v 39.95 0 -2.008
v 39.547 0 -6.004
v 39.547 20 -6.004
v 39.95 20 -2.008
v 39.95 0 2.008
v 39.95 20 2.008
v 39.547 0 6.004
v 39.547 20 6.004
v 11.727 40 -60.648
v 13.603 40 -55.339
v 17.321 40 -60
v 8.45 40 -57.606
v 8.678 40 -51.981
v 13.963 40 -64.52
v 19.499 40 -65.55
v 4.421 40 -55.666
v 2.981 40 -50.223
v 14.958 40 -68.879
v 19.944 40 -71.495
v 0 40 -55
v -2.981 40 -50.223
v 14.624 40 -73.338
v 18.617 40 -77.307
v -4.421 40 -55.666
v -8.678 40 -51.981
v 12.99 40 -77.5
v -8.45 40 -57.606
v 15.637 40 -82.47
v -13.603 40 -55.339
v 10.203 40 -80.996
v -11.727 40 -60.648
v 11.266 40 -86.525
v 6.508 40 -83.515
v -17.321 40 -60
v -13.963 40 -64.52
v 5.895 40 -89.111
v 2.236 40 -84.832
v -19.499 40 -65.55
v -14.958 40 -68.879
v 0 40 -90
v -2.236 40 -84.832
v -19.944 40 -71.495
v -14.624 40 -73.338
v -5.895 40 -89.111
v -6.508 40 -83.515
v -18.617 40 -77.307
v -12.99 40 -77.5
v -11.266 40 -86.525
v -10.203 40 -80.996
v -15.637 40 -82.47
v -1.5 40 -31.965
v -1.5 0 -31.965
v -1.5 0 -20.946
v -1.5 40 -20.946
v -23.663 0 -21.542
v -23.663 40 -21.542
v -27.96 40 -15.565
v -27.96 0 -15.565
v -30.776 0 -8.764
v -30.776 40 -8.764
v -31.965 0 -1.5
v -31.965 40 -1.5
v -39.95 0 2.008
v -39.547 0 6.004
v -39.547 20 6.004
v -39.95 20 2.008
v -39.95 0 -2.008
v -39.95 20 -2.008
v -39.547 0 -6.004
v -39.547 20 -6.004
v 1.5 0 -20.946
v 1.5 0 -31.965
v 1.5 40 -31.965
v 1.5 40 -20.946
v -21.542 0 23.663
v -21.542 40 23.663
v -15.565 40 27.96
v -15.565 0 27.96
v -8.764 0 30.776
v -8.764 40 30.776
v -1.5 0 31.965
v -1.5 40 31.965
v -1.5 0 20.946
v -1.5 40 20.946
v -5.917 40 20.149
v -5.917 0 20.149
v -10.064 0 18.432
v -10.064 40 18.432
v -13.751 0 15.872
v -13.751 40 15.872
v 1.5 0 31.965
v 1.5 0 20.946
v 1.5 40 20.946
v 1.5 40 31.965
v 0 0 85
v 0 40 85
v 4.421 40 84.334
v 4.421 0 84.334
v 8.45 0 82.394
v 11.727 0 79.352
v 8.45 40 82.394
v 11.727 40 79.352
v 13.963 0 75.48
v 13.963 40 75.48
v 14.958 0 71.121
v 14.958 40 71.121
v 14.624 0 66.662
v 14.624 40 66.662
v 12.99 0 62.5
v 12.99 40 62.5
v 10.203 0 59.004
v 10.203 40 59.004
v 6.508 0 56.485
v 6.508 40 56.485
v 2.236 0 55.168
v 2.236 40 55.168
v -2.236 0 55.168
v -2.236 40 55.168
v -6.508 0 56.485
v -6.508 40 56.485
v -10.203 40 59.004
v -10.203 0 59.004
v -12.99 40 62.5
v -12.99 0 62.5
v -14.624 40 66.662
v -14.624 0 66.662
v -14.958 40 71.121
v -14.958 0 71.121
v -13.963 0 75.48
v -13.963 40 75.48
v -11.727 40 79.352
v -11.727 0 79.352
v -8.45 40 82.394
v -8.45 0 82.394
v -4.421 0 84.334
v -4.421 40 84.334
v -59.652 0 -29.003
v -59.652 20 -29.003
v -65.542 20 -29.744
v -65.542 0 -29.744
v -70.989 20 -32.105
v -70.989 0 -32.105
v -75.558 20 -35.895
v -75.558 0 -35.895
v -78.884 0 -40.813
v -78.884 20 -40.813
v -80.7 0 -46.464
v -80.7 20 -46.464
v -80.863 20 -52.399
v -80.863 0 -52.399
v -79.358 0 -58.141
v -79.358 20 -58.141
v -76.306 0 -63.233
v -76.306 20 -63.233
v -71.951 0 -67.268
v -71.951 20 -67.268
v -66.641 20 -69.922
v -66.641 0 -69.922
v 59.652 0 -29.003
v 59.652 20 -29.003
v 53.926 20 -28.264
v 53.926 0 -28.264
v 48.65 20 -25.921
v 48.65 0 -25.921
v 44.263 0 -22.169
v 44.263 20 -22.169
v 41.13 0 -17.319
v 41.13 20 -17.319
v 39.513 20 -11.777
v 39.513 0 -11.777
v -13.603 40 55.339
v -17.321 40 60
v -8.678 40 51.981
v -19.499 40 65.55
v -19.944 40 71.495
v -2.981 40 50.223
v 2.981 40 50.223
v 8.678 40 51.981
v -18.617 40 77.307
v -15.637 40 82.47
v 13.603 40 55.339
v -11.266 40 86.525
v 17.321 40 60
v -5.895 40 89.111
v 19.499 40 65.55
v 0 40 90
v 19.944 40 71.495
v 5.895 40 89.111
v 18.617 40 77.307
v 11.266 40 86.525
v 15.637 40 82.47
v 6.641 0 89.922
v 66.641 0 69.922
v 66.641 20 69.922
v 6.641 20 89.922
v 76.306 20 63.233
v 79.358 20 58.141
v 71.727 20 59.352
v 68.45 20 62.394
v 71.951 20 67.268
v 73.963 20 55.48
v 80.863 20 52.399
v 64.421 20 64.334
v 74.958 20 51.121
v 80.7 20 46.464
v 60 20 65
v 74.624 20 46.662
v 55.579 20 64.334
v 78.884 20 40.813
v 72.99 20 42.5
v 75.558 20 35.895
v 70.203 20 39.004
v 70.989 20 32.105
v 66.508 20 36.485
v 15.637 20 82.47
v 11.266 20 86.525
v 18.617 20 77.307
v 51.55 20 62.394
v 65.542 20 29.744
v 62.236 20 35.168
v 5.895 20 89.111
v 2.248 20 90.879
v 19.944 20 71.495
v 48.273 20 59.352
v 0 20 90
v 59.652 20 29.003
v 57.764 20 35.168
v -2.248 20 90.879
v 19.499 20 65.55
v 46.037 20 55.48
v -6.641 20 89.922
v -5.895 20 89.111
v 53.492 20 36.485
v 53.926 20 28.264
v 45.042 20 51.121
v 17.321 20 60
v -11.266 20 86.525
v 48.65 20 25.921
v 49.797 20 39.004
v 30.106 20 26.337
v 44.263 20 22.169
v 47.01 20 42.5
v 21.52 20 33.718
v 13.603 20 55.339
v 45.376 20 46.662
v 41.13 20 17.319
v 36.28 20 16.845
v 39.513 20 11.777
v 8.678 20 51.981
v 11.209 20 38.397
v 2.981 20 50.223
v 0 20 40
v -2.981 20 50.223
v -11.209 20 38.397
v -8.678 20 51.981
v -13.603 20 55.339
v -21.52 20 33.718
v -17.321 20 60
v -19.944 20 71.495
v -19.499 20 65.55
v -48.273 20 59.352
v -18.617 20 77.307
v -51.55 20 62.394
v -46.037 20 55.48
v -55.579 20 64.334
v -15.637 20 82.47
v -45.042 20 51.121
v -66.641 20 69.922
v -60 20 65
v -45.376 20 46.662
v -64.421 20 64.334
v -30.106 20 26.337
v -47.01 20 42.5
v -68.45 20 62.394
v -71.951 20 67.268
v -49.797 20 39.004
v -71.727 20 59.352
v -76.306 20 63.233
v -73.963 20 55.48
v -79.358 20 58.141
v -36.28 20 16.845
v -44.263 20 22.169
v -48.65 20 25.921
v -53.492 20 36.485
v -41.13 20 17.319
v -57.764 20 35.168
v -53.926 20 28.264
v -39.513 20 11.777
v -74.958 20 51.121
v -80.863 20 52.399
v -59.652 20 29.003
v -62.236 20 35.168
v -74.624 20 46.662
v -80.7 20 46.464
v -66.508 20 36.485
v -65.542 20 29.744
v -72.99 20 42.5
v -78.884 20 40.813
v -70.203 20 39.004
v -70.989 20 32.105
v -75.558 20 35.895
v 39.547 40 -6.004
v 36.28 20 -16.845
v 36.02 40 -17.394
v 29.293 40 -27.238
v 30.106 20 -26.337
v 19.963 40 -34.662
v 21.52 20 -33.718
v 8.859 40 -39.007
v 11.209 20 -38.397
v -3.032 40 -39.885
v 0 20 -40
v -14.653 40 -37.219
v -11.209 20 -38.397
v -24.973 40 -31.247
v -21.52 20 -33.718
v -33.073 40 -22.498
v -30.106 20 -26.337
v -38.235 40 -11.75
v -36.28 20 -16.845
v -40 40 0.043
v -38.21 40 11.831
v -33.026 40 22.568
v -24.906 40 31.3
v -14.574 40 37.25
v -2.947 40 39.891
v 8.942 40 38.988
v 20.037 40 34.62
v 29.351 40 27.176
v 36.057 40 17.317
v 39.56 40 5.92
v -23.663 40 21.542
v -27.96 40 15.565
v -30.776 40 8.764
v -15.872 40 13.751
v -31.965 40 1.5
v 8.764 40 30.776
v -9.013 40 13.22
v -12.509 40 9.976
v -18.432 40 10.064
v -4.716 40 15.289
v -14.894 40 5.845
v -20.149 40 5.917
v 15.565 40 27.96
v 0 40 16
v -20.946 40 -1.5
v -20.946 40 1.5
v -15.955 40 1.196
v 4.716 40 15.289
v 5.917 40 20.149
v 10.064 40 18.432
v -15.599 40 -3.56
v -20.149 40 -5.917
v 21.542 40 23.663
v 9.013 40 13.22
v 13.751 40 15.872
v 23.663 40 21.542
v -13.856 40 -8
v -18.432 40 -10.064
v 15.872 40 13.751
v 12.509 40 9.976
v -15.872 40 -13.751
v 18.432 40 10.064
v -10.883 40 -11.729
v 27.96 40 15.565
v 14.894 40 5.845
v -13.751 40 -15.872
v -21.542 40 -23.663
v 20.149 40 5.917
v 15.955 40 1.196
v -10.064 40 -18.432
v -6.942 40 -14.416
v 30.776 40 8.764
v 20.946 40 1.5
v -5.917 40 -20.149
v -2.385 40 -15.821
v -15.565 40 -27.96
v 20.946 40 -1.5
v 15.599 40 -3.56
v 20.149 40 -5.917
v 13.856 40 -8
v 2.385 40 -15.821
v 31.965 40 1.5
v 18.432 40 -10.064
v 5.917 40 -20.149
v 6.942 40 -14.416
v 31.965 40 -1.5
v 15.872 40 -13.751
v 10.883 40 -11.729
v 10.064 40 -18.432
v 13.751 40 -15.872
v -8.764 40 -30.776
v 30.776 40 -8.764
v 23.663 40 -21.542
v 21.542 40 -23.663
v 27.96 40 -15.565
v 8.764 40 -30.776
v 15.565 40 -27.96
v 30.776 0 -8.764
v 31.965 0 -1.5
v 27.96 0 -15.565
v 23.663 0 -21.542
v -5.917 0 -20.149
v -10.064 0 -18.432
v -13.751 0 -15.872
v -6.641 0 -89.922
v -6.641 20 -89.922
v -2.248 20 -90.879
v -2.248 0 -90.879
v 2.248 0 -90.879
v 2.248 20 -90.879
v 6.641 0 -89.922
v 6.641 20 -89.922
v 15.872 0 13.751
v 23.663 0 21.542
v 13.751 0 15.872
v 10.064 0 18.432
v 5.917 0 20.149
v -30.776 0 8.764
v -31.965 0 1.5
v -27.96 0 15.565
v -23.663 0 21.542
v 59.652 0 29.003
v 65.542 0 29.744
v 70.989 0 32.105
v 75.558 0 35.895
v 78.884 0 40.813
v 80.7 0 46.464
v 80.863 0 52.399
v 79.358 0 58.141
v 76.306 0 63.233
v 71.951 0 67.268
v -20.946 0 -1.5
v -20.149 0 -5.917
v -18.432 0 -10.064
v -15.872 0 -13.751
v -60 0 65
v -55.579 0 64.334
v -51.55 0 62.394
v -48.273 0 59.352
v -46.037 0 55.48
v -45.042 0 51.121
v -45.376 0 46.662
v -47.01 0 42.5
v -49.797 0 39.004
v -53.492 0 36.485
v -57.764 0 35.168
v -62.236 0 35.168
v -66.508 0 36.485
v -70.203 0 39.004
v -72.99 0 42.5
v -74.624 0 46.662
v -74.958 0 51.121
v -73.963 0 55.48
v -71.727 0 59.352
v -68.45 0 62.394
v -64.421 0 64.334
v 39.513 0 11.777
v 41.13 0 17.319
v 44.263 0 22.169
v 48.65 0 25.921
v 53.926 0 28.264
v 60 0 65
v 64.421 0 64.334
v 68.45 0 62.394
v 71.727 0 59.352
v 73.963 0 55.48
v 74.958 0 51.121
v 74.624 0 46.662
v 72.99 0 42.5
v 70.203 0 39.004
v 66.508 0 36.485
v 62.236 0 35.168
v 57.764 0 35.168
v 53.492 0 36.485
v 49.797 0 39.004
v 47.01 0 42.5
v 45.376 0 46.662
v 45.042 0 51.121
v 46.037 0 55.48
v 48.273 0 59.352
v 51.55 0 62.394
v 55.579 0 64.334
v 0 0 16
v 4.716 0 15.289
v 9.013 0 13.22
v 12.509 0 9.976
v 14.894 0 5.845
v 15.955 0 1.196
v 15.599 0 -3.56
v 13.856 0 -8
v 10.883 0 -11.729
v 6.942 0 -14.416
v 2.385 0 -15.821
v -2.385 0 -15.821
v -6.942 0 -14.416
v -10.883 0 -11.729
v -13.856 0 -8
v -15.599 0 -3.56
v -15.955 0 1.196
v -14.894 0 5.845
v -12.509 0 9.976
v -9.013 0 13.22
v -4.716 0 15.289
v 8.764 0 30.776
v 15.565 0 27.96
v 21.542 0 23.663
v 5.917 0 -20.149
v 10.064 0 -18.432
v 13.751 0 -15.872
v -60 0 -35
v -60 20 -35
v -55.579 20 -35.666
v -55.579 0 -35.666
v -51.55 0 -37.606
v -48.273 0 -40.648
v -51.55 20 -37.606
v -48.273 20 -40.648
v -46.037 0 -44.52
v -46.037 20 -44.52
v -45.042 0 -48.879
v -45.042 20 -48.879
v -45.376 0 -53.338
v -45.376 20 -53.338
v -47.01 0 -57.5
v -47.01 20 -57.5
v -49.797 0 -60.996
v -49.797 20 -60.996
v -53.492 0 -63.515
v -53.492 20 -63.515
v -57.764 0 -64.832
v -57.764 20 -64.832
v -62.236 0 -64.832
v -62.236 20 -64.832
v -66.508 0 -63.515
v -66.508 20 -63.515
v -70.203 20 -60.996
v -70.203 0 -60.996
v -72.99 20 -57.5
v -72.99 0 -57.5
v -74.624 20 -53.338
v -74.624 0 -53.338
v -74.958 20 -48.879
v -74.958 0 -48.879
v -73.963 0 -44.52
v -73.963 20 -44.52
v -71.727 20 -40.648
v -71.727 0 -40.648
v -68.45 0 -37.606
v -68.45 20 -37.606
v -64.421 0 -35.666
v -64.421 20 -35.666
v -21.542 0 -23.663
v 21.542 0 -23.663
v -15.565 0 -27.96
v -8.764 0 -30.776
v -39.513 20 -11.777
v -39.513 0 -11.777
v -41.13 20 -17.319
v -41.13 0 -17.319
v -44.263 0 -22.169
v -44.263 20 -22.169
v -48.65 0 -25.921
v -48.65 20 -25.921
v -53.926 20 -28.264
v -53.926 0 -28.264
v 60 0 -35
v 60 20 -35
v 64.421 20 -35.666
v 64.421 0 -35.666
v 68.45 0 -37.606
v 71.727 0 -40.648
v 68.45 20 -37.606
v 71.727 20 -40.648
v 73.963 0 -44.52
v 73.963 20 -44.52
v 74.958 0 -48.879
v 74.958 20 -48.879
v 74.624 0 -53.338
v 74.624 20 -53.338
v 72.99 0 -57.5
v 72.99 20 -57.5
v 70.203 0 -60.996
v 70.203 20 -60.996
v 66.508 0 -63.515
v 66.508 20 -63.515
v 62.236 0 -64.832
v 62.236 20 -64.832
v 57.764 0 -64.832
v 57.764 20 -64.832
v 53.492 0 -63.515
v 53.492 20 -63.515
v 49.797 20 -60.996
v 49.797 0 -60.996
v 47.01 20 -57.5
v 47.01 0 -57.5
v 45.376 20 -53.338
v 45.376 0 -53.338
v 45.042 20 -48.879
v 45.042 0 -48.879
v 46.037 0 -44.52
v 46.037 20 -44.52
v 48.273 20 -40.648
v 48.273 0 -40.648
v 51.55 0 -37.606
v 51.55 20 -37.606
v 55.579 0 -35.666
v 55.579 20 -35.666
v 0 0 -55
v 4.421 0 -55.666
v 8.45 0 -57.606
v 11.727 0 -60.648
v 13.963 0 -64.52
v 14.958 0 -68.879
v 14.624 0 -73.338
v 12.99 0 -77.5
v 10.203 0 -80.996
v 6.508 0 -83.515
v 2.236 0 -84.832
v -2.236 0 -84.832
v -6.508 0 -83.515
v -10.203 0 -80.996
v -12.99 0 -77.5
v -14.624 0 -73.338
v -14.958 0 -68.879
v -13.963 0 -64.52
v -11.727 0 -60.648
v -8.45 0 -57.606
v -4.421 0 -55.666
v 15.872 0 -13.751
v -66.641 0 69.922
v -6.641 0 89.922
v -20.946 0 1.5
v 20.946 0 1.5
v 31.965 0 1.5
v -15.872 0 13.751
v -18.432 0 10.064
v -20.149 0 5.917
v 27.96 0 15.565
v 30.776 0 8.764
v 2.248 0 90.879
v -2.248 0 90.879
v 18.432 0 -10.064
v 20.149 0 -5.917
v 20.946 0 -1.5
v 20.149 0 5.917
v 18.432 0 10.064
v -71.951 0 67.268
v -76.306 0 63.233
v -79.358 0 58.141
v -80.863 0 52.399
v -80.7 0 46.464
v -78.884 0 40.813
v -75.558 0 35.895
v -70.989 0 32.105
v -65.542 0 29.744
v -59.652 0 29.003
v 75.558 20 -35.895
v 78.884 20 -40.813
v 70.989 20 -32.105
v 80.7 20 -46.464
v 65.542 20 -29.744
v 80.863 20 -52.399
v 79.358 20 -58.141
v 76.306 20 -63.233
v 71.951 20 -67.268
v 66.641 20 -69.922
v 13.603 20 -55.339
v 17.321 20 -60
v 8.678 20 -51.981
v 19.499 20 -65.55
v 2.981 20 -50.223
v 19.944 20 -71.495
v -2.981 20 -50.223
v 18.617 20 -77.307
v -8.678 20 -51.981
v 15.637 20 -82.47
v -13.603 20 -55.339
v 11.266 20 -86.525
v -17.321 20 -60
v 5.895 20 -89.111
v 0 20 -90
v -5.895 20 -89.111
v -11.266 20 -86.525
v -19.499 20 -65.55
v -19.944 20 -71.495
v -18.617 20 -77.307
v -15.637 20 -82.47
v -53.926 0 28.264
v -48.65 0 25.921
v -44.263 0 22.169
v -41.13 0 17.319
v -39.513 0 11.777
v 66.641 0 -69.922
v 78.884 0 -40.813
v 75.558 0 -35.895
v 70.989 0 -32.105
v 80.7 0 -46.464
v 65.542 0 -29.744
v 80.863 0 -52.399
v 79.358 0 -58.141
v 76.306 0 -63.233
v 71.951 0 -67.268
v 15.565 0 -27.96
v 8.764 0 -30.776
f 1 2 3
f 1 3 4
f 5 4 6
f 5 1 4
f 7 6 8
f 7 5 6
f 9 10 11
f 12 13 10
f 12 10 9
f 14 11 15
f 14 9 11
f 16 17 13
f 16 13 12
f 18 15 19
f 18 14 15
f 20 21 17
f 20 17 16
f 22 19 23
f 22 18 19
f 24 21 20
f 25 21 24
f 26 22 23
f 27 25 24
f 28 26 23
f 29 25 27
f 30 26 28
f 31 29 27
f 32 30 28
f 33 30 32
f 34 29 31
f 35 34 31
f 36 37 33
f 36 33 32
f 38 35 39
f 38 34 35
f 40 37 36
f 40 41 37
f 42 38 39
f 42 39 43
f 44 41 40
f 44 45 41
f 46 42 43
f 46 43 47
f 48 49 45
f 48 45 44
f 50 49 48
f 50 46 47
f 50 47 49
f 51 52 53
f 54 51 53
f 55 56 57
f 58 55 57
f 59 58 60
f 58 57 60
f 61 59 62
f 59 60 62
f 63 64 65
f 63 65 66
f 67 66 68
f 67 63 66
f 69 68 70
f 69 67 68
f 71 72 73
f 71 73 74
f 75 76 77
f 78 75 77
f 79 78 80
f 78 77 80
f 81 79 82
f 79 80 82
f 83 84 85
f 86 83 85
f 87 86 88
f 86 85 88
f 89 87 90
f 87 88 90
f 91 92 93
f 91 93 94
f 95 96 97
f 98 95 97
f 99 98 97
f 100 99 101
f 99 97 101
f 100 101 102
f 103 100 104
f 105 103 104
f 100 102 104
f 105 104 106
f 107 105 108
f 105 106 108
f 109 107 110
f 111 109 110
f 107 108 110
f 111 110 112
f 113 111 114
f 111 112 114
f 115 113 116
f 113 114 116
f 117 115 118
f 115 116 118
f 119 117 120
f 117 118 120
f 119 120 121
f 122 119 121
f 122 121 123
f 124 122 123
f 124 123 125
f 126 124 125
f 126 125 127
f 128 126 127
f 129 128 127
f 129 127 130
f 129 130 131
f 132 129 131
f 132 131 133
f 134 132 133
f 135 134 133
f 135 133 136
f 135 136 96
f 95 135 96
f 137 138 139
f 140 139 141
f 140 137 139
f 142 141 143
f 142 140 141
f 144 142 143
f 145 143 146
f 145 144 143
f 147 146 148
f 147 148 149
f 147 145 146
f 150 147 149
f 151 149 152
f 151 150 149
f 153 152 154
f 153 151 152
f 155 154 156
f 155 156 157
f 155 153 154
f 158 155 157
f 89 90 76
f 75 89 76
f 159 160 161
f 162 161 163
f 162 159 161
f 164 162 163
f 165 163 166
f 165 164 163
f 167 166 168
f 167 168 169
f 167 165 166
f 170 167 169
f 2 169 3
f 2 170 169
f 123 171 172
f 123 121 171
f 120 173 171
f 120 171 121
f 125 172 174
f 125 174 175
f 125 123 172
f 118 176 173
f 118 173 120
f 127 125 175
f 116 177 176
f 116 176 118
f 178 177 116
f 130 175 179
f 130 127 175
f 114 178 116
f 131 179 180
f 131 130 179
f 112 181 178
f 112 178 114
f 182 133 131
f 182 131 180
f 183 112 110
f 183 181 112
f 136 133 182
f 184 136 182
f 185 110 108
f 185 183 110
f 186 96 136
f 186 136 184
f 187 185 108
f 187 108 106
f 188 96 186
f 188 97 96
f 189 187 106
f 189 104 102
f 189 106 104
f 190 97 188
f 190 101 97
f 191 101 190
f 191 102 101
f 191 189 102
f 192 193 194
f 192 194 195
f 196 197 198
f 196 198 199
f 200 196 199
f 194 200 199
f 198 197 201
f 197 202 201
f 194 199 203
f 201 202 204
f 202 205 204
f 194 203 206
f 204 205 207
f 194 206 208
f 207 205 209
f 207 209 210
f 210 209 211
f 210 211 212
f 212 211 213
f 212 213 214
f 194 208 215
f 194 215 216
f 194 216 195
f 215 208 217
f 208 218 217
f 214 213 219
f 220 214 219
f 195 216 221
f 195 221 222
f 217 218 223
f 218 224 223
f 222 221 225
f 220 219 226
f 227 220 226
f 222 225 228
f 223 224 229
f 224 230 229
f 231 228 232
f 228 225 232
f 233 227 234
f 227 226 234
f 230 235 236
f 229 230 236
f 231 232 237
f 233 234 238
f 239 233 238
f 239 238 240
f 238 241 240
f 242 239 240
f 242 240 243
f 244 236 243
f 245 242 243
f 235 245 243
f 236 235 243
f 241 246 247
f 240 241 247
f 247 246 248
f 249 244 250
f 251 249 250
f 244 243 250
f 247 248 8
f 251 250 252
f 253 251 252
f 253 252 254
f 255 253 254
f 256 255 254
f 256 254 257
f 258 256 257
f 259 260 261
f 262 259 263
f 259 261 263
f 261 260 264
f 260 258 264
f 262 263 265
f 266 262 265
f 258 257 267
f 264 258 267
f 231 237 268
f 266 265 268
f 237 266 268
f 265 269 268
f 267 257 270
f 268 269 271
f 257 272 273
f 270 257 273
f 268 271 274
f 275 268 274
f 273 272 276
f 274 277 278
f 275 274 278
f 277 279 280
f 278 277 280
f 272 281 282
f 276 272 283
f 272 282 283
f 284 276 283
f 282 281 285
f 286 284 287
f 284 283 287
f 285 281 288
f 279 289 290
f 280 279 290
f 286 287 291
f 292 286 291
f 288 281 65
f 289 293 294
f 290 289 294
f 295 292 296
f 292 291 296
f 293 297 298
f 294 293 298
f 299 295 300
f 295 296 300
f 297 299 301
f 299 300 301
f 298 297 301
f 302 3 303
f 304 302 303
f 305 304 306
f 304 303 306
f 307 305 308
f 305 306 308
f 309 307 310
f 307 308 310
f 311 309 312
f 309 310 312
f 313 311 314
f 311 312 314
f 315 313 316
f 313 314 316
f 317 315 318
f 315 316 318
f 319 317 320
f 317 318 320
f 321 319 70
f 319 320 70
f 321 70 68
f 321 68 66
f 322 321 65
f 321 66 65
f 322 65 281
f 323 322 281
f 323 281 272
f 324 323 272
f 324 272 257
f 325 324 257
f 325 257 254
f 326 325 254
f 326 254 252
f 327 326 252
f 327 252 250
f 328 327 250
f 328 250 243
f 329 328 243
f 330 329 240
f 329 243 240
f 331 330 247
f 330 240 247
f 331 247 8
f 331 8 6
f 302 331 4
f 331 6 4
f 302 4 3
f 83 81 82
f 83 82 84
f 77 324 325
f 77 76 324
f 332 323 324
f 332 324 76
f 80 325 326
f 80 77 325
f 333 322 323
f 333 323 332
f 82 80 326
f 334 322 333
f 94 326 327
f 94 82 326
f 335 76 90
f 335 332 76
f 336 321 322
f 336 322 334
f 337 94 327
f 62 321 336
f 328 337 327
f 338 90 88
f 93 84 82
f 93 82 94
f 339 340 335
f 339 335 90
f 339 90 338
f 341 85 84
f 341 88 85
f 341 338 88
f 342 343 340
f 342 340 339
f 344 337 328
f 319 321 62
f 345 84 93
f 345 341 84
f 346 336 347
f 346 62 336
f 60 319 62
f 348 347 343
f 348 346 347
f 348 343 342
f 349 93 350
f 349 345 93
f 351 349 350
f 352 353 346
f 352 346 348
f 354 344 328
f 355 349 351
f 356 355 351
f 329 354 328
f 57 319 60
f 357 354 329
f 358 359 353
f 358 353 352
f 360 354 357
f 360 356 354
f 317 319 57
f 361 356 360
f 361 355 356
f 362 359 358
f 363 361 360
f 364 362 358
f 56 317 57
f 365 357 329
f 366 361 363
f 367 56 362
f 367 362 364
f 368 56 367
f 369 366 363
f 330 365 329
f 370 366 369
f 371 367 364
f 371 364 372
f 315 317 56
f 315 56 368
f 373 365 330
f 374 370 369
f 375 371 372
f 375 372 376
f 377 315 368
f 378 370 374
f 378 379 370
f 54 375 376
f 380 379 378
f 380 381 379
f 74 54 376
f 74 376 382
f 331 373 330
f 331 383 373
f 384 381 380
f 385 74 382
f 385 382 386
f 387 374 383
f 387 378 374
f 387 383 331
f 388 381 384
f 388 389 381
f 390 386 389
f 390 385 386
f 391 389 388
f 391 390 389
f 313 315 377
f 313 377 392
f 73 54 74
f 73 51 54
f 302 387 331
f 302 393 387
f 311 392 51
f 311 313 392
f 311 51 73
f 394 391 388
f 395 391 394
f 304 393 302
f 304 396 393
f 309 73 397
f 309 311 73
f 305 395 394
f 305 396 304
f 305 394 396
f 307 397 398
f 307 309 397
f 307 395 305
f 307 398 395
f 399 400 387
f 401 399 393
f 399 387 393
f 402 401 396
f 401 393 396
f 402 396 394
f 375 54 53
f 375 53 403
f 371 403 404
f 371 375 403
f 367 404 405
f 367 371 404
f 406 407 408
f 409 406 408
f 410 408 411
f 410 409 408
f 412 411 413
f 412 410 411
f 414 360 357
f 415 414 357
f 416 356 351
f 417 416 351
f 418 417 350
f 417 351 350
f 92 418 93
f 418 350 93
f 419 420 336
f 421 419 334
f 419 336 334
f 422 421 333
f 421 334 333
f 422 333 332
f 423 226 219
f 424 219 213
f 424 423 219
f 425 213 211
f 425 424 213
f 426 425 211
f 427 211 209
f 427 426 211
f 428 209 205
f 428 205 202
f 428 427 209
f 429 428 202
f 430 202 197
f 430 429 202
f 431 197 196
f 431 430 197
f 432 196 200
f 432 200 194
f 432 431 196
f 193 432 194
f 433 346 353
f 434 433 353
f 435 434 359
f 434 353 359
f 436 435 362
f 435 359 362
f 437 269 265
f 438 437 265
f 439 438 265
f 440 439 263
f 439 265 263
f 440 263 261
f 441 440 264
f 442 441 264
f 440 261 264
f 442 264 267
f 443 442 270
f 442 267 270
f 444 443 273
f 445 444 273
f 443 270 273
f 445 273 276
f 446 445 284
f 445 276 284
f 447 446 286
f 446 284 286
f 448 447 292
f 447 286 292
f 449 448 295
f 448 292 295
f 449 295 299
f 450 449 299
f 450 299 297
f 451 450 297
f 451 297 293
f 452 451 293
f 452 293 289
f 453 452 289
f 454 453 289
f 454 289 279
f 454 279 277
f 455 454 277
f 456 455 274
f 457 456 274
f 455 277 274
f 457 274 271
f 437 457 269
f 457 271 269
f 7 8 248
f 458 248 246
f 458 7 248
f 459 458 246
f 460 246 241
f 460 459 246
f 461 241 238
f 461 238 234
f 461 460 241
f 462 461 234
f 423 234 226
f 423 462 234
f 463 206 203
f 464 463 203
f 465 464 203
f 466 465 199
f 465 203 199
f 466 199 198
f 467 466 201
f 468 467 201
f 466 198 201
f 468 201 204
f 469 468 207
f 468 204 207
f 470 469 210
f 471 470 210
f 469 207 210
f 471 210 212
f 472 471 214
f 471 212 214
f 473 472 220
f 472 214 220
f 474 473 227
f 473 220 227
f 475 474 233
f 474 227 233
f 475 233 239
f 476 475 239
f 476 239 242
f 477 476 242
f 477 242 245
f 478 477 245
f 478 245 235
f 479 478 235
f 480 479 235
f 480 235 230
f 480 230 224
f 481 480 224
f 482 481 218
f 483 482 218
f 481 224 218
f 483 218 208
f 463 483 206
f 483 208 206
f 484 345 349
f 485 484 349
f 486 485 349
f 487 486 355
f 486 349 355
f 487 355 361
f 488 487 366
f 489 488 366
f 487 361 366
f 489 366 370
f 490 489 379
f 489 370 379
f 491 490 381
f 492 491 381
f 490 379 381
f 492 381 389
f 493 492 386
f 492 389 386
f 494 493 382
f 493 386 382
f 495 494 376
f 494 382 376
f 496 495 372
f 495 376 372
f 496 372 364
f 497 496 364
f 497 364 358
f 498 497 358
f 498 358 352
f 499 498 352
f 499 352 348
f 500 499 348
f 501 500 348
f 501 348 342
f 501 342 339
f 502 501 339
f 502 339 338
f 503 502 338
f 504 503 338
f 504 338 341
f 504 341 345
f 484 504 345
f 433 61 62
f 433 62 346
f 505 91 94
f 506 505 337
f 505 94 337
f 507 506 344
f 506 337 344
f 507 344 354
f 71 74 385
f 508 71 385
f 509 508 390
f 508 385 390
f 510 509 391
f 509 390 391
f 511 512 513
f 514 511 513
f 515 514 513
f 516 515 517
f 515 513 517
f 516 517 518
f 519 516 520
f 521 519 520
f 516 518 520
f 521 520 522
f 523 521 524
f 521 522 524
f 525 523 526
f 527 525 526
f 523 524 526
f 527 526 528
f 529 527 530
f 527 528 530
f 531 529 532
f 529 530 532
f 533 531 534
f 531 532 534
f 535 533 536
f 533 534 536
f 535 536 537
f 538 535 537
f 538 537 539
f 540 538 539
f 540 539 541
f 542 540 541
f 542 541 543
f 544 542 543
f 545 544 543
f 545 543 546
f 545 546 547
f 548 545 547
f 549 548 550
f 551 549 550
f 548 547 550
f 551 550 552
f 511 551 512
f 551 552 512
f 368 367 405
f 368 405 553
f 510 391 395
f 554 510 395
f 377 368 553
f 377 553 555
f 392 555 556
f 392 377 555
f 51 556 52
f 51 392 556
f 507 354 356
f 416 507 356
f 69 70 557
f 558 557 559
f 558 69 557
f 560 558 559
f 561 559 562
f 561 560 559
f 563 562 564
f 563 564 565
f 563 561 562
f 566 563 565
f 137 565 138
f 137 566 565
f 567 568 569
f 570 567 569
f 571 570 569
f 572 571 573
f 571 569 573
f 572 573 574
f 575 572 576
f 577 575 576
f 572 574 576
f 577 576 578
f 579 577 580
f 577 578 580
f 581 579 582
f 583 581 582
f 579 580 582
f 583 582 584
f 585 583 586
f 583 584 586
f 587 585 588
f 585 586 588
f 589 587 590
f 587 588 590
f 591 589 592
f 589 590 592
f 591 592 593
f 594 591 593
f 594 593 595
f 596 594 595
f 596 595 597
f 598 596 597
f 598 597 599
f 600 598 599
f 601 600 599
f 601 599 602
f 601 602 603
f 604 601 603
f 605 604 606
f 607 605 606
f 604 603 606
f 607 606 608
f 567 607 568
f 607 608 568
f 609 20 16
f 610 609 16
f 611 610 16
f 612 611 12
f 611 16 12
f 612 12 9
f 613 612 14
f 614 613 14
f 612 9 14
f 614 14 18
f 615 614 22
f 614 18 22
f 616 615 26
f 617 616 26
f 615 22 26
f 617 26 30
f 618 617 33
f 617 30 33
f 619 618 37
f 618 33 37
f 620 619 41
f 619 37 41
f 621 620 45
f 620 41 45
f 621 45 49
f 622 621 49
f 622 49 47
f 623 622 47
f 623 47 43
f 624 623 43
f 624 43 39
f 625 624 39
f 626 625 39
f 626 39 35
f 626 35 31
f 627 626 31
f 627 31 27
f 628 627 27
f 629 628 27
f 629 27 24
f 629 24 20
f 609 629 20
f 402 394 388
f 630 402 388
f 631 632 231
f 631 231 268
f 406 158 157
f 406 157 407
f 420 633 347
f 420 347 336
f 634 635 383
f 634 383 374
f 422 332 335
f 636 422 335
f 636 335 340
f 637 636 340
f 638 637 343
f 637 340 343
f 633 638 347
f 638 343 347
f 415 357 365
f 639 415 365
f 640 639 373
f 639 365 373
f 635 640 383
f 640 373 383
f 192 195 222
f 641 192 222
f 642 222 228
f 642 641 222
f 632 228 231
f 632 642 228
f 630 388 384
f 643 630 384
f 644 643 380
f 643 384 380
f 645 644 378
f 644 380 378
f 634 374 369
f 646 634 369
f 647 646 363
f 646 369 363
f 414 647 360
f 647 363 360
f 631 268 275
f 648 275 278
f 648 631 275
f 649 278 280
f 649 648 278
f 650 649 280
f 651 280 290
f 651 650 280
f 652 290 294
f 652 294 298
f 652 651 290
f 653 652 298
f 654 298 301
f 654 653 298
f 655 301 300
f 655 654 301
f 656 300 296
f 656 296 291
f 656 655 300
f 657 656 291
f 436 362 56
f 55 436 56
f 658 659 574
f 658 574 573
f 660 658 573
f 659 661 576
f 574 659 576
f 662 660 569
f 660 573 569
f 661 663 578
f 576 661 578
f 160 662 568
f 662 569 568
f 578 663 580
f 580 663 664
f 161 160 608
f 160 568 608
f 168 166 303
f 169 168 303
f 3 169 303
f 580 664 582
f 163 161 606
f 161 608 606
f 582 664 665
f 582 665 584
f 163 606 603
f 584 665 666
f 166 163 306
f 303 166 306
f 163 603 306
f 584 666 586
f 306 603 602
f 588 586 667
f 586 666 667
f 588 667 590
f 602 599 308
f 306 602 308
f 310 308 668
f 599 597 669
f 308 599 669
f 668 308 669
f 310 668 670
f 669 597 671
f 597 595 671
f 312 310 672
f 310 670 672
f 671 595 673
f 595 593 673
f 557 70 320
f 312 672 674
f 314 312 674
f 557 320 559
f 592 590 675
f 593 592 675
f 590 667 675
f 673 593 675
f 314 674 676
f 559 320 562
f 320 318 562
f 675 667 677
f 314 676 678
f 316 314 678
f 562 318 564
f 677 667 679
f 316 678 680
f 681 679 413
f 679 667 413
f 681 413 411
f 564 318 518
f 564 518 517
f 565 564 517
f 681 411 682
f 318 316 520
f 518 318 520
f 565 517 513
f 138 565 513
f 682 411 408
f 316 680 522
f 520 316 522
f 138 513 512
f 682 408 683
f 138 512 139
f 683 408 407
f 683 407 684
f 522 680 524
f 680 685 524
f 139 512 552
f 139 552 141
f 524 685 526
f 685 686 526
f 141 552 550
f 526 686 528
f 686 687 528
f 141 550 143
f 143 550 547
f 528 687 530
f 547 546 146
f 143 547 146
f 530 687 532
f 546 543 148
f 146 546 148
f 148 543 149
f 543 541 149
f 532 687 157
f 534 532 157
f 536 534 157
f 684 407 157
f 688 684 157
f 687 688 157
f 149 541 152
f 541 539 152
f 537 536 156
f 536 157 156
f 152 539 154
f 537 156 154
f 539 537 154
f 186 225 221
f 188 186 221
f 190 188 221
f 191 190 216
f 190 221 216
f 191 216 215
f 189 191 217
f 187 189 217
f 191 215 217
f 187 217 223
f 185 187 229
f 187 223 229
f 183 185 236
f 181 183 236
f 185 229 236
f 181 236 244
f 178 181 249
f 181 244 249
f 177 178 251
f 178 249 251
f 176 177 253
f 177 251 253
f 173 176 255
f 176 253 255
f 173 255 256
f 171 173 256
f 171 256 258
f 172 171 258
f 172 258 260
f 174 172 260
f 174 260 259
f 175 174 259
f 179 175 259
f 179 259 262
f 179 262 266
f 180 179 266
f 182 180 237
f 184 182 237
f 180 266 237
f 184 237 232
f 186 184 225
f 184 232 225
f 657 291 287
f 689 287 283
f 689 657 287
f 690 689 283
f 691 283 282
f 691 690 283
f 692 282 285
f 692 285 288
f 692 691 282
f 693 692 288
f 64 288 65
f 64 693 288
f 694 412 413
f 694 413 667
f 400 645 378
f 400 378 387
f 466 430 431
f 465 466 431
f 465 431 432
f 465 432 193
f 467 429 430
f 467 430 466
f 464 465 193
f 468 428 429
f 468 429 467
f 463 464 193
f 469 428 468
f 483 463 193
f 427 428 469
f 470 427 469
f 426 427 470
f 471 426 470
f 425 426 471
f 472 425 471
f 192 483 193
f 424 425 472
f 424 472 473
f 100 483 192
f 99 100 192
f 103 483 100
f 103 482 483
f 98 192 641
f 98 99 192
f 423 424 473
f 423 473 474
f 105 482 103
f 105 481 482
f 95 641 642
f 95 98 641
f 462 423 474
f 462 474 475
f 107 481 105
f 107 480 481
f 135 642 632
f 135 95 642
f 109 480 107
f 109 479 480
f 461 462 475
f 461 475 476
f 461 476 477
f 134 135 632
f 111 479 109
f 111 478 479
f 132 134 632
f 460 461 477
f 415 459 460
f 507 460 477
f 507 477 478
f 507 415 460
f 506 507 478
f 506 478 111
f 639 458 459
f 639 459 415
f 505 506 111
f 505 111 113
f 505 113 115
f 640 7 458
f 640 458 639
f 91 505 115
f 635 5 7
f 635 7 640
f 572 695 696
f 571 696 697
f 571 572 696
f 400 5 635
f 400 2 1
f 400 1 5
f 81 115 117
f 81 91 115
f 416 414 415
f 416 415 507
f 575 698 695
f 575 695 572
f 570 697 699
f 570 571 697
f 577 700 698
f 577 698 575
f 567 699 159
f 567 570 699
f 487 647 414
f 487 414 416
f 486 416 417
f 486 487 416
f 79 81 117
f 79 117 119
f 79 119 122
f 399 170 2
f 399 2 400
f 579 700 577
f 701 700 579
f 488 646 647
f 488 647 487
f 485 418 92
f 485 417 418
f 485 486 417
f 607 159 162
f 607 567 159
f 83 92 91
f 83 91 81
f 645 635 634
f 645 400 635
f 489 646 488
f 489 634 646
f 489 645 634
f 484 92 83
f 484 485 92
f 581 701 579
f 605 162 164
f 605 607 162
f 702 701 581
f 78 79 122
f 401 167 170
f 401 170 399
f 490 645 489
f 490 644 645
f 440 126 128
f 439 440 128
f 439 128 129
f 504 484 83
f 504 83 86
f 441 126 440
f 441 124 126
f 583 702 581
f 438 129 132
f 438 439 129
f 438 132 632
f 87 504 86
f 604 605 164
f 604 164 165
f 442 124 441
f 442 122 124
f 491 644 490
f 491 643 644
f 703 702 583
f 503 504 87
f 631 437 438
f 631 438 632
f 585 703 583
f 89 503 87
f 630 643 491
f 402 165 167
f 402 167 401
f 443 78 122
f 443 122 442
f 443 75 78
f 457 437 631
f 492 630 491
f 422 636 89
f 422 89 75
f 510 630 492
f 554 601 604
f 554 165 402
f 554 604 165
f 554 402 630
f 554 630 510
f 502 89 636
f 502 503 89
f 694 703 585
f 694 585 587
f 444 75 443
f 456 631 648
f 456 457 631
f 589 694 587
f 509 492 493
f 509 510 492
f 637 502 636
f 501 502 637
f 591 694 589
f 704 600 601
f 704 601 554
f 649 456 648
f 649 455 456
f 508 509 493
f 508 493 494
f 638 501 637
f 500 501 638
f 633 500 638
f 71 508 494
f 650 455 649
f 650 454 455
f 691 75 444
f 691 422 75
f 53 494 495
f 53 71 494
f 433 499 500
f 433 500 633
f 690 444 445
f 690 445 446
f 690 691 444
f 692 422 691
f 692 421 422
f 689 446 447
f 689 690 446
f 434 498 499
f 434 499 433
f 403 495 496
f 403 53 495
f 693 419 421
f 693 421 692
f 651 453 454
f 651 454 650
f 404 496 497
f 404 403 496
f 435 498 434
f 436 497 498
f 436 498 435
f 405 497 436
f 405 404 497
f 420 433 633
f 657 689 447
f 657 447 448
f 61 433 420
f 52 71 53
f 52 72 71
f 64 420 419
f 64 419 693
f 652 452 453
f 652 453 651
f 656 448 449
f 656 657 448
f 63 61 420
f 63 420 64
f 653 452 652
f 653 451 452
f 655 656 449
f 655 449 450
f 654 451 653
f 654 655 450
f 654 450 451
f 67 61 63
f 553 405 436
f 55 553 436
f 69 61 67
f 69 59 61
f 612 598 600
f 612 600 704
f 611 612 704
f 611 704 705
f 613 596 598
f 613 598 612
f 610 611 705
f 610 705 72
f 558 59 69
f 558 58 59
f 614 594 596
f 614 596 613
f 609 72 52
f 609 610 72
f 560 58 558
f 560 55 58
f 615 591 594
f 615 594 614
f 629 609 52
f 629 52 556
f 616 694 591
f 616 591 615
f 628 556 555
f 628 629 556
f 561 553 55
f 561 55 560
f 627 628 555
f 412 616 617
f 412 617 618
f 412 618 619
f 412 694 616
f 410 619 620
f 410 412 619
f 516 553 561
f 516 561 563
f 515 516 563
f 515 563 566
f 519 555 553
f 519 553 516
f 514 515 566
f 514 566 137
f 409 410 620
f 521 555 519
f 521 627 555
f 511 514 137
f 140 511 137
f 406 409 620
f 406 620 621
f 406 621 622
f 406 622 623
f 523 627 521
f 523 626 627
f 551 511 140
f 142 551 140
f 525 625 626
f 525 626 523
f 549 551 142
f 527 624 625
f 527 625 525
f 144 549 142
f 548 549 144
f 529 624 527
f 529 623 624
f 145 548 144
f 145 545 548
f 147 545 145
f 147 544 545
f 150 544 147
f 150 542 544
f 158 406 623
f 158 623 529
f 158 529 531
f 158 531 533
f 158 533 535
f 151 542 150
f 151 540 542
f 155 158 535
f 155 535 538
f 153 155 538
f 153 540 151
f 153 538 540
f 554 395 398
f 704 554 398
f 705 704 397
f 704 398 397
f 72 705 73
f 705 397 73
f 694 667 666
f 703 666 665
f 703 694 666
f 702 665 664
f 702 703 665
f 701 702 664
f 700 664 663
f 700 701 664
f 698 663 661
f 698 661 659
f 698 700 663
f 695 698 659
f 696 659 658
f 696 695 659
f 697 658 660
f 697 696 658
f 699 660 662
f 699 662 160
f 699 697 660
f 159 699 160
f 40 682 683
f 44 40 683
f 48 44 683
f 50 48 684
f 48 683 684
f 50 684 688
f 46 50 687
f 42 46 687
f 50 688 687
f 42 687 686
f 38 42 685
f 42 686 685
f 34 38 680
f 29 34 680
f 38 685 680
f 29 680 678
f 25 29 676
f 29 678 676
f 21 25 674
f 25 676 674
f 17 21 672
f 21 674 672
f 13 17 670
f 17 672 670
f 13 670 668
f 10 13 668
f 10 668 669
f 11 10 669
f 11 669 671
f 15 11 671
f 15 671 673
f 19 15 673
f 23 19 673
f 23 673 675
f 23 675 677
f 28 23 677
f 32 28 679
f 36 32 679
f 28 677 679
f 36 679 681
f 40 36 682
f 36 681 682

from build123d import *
from build123d.topology import SkipClean

# Parameters (mm, degrees)
BOSS_EXTRUDE2_DEPTH = 20
SKETCH2_R           = 40
SKETCH2_R_2         = 20
BOSS_EXTRUDE3_DEPTH = 20
SKETCH2_5_R         = 15
CUT_EXTRUDE1_DEPTH  = 20
SKETCH3_R           = 16
CUT_EXTRUDE2_DEPTH  = 129.226362344
SKETCH4_R           = 15
CUT_EXTRUDE3_DEPTH  = 129.226362344


with BuildPart() as part:
    # Sketch1 → Boss-Extrude2 (new body)
    with BuildSketch(Plane(origin=(0, 0, 0), x_dir=(1, 0, 0), z_dir=(0, 1, 0))):
        with BuildLine():
            Line((-66.640783086, 69.922349259), (-6.640783086, 89.922349259))
            ThreePointArc((-6.640783086, 89.922349259), (0, 91), (6.640783086, 89.922349259))
            Line((6.640783086, 89.922349259), (66.640783086, 69.922349259))
            ThreePointArc((66.640783086, 69.922349259), (80.700240831, 46.464461919), (59.651863383, 29.002885891))
            ThreePointArc((59.651863383, 29.002885891), (44.262528341, 22.168588856), (39.546869801, 6.003756239))
            ThreePointArc((39.546869801, 6.003756239), (40, 0), (39.546869801, -6.003756239))
            ThreePointArc((39.546869801, -6.003756239), (44.262528341, -22.168588856), (59.651863383, -29.002885891))
            ThreePointArc((59.651863383, -29.002885891), (80.700240831, -46.464461919), (66.640783086, -69.922349259))
            Line((66.640783086, -69.922349259), (6.640783086, -89.922349259))
            ThreePointArc((6.640783086, -89.922349259), (0, -91), (-6.640783086, -89.922349259))
            Line((-6.640783086, -89.922349259), (-66.640783086, -69.922349259))
            ThreePointArc((-66.640783086, -69.922349259), (-80.700240831, -46.464461919), (-59.651863383, -29.002885891))
            ThreePointArc((-59.651863383, -29.002885891), (-44.262528341, -22.168588856), (-39.546869801, -6.003756239))
            ThreePointArc((-39.546869801, -6.003756239), (-40, 0), (-39.546869801, 6.003756239))
            ThreePointArc((-39.546869801, 6.003756239), (-44.262528341, 22.168588856), (-59.651863383, 29.002885891))
            ThreePointArc((-59.651863383, 29.002885891), (-80.700240831, 46.464461919), (-66.640783086, 69.922349259))
        make_face()
    extrude(amount=BOSS_EXTRUDE2_DEPTH)

    # Sketch2 → Boss-Extrude3 (add)
    with SkipClean():  # the faces are left unmerged after this step: merging them gives an invalid solid
        with BuildSketch(Plane(origin=(0, 20, 0), x_dir=(1, 0, 0), z_dir=(0, 1, 0))):
            Circle(SKETCH2_R)
            with Locations((0, 70)):
                Circle(SKETCH2_R_2)
            with Locations((0, -70)):
                Circle(SKETCH2_R_2)
        extrude(amount=BOSS_EXTRUDE3_DEPTH)

    # Sketch2<5> → Cut-Extrude1 (cut)
    with SkipClean():  # the faces are left unmerged after this step: merging them gives an invalid solid
        with BuildSketch(Plane(origin=(0, 20, 0), x_dir=(1, 0, 0), z_dir=(0, 1, 0))):
            with Locations((60, 50)):
                Circle(SKETCH2_5_R)
            with Locations((-60, 50)):
                Circle(SKETCH2_5_R)
            with Locations((60, -50)):
                Circle(SKETCH2_5_R)
            with Locations((-60, -50)):
                Circle(SKETCH2_5_R)
        extrude(amount=-CUT_EXTRUDE1_DEPTH, mode=Mode.SUBTRACT)

    # Sketch3 → Cut-Extrude2 (cut, through all)
    with SkipClean():  # the faces are left unmerged after this step: merging them gives an invalid solid
        with BuildSketch(Plane(origin=(0, 40, 0), x_dir=(1, 0, 0), z_dir=(0, 1, 0))):
            Circle(SKETCH3_R)
            with BuildLine():
                Line((-1.5, 31.964824417), (-1.5, 20.946360066))
                ThreePointArc((-1.5, 20.946360066), (-8.03635208, 19.401470183), (-13.750653072, 15.871973415))
                Line((-13.750653072, 15.871973415), (-21.541883933, 23.663204276))
                ThreePointArc((-21.541883933, 23.663204276), (-12.245869836, 29.56414504), (-1.5, 31.964824417))
            make_face()
            with BuildLine():
                Line((1.5, 31.964824417), (1.5, 20.946360066))
                ThreePointArc((1.5, 20.946360066), (8.03635208, 19.401470183), (13.750653072, 15.871973415))
                Line((13.750653072, 15.871973415), (21.541883933, 23.663204276))
                ThreePointArc((21.541883933, 23.663204276), (12.245869836, 29.56414504), (1.5, 31.964824417))
            make_face()
            with BuildLine():
                Line((23.663204276, 21.541883933), (15.871973415, 13.750653072))
                ThreePointArc((15.871973415, 13.750653072), (19.401470183, 8.03635208), (20.946360066, 1.5))
                Line((20.946360066, 1.5), (31.964824417, 1.5))
                ThreePointArc((31.964824417, 1.5), (29.56414504, 12.245869836), (23.663204276, 21.541883933))
            make_face()
            with BuildLine():
                Line((31.964824417, -1.5), (20.946360066, -1.5))
                ThreePointArc((20.946360066, -1.5), (19.401470183, -8.03635208), (15.871973415, -13.750653072))
                Line((15.871973415, -13.750653072), (23.663204276, -21.541883933))
                ThreePointArc((23.663204276, -21.541883933), (29.56414504, -12.245869836), (31.964824417, -1.5))
            make_face()
            with BuildLine():
                Line((21.541883933, -23.663204276), (13.750653072, -15.871973415))
                ThreePointArc((13.750653072, -15.871973415), (8.03635208, -19.401470183), (1.5, -20.946360066))
                Line((1.5, -20.946360066), (1.5, -31.964824417))
                ThreePointArc((1.5, -31.964824417), (12.245869836, -29.56414504), (21.541883933, -23.663204276))
            make_face()
            with BuildLine():
                Line((-1.5, -31.964824417), (-1.5, -20.946360066))
                ThreePointArc((-1.5, -20.946360066), (-8.03635208, -19.401470183), (-13.750653072, -15.871973415))
                Line((-13.750653072, -15.871973415), (-21.541883933, -23.663204276))
                ThreePointArc((-21.541883933, -23.663204276), (-12.245869836, -29.56414504), (-1.5, -31.964824417))
            make_face()
            with BuildLine():
                Line((-23.663204276, -21.541883933), (-15.871973415, -13.750653072))
                ThreePointArc((-15.871973415, -13.750653072), (-19.401470183, -8.03635208), (-20.946360066, -1.5))
                Line((-20.946360066, -1.5), (-31.964824417, -1.5))
                ThreePointArc((-31.964824417, -1.5), (-29.56414504, -12.245869836), (-23.663204276, -21.541883933))
            make_face()
            with BuildLine():
                Line((-31.964824417, 1.5), (-20.946360066, 1.5))
                ThreePointArc((-20.946360066, 1.5), (-19.401470183, 8.03635208), (-15.871973415, 13.750653072))
                Line((-15.871973415, 13.750653072), (-23.663204276, 21.541883933))
                ThreePointArc((-23.663204276, 21.541883933), (-29.56414504, 12.245869836), (-31.964824417, 1.5))
            make_face()
        extrude(amount=-CUT_EXTRUDE2_DEPTH, mode=Mode.SUBTRACT)

    # Sketch4 → Cut-Extrude3 (cut, through all)
    with SkipClean():  # the faces are left unmerged after this step: merging them gives an invalid solid
        with BuildSketch(Plane(origin=(0, 40, 0), x_dir=(1, 0, 0), z_dir=(0, 1, 0))):
            with Locations((0, 70)):
                Circle(SKETCH4_R)
            with Locations((0, -70)):
                Circle(SKETCH4_R)
        extrude(amount=-CUT_EXTRUDE3_DEPTH, mode=Mode.SUBTRACT)


solid = part.part
